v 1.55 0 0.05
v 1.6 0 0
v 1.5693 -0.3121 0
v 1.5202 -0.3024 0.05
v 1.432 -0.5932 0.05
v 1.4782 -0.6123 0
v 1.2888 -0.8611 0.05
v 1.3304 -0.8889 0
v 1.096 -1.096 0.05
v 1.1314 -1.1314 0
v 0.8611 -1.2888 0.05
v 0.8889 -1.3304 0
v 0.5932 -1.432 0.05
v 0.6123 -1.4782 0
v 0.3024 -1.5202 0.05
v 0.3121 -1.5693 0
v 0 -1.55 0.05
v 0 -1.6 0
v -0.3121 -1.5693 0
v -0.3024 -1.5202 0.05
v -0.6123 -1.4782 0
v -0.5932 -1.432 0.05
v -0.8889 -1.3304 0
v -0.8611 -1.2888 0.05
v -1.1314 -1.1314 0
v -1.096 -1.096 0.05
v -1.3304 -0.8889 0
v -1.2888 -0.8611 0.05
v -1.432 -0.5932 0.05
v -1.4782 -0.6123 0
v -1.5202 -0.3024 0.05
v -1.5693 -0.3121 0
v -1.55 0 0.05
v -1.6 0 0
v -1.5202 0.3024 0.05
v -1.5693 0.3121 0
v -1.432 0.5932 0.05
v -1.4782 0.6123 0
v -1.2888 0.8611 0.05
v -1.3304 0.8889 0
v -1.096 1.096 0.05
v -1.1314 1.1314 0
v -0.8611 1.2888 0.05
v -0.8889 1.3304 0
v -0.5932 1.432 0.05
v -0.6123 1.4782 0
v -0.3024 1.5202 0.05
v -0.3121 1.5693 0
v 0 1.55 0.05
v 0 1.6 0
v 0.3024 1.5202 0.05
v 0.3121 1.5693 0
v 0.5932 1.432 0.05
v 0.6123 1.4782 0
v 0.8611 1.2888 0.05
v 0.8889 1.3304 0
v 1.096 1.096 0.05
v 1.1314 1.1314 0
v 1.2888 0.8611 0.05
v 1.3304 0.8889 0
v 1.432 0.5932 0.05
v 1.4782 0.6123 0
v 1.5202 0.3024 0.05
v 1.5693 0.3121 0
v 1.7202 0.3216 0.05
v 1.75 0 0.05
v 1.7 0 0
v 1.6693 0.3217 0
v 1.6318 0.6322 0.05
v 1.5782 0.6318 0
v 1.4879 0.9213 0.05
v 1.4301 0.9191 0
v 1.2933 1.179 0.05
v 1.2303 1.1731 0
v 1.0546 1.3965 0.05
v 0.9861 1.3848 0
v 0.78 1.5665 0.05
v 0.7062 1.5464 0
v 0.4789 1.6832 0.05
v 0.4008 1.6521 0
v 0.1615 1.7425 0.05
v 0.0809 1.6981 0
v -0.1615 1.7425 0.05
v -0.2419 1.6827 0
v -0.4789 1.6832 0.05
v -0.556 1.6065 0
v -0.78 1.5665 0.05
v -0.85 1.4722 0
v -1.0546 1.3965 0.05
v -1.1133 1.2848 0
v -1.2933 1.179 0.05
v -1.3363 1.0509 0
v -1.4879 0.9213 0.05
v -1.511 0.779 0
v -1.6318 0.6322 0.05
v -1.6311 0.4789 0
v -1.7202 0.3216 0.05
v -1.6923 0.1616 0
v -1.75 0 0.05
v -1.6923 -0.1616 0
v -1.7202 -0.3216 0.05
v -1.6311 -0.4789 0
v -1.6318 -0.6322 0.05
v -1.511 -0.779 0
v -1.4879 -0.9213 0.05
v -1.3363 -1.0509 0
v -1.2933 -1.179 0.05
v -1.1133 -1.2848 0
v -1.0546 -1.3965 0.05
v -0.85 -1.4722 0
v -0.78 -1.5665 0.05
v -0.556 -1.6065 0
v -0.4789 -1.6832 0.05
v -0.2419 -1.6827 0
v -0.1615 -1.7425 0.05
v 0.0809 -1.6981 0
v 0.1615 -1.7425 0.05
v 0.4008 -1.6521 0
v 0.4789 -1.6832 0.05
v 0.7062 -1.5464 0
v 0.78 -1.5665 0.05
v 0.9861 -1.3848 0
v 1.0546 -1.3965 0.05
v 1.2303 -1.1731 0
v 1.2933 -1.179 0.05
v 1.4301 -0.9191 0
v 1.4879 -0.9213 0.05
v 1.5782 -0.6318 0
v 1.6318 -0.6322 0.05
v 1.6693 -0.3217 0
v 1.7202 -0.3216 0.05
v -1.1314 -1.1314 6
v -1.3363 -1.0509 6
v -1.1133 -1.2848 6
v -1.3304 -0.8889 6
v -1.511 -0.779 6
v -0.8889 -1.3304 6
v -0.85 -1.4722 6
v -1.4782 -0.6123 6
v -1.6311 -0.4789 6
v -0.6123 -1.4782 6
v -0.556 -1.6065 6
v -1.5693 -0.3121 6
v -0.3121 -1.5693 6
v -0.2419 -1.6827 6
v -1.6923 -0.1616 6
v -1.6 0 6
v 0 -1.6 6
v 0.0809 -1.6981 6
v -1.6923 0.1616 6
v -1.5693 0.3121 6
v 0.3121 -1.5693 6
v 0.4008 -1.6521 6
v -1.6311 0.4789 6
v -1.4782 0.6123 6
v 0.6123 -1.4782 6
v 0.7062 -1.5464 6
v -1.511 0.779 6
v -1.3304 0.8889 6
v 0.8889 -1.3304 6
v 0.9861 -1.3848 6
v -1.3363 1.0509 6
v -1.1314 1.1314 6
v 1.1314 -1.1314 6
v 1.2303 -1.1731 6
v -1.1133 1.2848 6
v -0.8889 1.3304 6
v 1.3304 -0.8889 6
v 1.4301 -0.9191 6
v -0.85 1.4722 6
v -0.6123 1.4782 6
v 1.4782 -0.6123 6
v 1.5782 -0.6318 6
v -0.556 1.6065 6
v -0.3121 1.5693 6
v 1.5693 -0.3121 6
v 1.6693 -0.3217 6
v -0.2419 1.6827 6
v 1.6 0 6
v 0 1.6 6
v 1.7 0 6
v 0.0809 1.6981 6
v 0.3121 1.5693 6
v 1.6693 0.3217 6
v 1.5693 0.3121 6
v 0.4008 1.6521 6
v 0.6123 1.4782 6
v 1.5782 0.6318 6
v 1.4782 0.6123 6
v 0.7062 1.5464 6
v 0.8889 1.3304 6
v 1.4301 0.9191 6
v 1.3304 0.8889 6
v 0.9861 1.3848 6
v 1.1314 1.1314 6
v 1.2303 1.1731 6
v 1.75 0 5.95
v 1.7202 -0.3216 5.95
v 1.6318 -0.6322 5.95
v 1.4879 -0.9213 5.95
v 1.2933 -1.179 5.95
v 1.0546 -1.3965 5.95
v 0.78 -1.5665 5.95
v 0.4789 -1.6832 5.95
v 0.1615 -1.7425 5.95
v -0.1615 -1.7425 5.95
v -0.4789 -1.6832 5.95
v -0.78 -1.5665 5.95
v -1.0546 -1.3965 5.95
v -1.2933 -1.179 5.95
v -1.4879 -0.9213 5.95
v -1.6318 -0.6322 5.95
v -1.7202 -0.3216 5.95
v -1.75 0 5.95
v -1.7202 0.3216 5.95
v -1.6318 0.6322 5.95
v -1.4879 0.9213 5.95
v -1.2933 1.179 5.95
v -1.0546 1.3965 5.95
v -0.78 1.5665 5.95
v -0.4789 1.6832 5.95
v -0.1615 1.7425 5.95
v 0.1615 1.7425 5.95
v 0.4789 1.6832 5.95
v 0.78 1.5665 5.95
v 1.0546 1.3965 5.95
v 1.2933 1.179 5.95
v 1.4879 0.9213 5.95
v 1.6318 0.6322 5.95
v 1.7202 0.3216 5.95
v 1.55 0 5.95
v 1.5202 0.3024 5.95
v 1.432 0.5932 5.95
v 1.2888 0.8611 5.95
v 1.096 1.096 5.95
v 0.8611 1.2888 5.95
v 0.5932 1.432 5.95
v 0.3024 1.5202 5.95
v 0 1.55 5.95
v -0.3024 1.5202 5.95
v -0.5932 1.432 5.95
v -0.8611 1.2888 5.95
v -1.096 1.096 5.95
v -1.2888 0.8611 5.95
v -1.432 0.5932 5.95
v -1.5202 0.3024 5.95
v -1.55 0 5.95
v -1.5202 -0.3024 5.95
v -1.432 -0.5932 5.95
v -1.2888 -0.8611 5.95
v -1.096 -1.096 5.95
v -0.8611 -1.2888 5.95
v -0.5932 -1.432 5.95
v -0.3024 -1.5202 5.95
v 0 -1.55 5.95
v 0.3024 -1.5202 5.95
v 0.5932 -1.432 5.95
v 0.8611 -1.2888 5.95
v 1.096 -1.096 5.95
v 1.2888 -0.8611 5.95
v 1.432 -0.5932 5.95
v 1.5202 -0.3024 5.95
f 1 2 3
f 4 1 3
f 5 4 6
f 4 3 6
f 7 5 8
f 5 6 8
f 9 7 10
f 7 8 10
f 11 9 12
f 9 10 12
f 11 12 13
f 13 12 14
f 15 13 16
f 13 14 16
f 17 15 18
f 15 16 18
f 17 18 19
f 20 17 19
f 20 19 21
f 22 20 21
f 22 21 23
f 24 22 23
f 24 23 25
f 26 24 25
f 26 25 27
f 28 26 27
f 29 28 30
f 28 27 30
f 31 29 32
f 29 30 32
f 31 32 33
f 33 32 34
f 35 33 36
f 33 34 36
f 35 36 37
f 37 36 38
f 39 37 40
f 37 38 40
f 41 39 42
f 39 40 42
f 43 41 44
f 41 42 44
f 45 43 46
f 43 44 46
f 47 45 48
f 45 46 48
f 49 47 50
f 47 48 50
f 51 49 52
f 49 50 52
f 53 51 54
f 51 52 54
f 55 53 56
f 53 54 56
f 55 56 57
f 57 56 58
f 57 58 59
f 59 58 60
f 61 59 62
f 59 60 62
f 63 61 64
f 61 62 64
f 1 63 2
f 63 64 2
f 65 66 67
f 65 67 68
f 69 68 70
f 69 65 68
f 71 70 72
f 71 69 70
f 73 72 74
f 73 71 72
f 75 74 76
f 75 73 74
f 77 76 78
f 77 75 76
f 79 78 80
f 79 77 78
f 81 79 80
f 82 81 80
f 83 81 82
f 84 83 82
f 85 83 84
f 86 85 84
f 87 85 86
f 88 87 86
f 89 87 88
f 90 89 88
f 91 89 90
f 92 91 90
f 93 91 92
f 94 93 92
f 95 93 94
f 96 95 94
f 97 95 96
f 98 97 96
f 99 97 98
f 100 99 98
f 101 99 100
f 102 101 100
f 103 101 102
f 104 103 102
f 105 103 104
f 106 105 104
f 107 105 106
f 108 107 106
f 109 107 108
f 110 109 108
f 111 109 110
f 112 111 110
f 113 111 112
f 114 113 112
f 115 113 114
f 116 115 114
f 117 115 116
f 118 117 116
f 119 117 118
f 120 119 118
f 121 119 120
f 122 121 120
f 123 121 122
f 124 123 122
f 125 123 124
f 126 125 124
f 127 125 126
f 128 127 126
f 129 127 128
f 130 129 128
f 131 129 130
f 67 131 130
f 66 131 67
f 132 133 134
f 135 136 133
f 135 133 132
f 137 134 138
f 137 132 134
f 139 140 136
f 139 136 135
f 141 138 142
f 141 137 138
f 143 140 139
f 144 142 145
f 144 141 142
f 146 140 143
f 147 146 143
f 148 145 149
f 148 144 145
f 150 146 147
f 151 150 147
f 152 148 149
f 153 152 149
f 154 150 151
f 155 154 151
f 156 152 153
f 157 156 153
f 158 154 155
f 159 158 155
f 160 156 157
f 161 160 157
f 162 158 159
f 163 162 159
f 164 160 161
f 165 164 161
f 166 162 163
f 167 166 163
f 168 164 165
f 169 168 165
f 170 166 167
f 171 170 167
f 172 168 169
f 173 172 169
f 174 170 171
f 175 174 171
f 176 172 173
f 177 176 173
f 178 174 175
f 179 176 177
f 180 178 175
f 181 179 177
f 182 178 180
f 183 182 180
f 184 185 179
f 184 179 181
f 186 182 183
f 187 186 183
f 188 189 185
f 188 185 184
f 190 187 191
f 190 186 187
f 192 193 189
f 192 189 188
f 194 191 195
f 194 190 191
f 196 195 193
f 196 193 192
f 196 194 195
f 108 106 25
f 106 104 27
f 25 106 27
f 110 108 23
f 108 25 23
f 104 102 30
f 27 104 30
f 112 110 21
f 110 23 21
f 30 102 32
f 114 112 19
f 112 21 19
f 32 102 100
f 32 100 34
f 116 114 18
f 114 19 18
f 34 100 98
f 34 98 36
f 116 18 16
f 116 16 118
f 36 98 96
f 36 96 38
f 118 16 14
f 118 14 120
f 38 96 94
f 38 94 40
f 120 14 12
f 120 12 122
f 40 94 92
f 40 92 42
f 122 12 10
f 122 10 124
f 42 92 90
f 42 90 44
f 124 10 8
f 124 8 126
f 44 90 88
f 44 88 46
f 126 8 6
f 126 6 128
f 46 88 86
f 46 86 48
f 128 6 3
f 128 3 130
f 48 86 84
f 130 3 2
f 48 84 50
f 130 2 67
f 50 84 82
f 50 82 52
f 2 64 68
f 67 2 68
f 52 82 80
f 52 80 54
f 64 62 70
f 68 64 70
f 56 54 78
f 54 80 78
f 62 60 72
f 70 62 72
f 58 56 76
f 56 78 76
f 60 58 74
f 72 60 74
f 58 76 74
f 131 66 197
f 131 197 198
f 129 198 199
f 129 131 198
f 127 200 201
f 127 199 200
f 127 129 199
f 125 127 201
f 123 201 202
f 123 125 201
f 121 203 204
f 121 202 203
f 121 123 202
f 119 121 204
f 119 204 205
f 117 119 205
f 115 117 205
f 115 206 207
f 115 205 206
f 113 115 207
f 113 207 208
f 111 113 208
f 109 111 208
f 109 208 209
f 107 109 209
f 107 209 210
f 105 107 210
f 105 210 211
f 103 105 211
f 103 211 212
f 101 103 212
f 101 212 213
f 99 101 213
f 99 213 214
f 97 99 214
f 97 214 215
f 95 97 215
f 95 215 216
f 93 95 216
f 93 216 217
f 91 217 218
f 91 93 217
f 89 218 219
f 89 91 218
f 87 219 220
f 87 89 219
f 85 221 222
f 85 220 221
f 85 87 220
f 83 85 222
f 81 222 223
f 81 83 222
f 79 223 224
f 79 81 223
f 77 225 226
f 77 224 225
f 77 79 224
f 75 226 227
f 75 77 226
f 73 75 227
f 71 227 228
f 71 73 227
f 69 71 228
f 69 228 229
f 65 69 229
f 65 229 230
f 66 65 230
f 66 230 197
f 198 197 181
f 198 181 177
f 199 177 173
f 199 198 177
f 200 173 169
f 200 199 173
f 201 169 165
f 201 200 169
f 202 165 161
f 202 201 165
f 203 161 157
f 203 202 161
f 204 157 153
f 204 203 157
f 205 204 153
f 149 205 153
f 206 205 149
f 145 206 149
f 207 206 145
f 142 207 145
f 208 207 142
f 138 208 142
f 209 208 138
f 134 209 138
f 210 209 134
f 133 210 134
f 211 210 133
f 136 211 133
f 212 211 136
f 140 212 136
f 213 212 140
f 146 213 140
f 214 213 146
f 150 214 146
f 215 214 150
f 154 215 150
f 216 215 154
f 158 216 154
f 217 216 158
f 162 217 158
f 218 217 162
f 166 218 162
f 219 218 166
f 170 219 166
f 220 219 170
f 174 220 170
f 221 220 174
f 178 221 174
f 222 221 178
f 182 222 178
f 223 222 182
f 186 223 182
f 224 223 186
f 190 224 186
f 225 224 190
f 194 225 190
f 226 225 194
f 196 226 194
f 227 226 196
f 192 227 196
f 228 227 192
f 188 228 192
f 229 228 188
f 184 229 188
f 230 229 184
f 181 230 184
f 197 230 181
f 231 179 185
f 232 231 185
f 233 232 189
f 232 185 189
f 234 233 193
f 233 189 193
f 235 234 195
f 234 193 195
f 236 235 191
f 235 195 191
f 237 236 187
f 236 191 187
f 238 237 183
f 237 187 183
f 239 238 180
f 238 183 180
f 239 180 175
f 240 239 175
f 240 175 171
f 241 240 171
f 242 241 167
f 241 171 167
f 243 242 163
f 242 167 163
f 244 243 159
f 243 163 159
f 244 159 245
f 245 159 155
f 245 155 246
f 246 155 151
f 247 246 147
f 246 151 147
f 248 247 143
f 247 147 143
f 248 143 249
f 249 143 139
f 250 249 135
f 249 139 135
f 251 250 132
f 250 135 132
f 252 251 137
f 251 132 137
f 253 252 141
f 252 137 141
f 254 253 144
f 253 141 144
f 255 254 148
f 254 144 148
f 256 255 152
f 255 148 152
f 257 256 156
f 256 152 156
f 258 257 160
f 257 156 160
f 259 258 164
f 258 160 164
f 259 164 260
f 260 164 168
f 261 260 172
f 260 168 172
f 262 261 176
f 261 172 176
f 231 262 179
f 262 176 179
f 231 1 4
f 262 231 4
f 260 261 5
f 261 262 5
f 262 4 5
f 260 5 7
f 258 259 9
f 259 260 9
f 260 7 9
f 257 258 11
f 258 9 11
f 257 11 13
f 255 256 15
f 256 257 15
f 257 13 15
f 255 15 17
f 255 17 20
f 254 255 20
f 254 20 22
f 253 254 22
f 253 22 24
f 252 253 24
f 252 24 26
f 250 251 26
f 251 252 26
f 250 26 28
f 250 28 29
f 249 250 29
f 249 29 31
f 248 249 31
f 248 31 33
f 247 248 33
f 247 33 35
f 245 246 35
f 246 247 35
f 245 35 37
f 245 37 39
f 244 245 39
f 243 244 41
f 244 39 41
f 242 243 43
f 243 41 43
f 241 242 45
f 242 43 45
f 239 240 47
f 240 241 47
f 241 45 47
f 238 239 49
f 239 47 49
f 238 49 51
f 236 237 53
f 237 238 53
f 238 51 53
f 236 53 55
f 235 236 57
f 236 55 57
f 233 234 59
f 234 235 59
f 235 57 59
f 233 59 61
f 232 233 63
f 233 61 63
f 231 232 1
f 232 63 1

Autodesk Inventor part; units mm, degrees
ref_plane "YZ Plane" through (0, 0, 0) normal (1, 0, 0) x (0, 1, 0)
ref_plane "XZ Plane" through (0, 0, 0) normal (0, 1, 0) x (-1, 0, 0)
ref_plane "XY Plane" through (0, 0, 0) normal (0, 0, 1) x (1, 0, 0)
sketch "Sketch1" plane through (0, 0, 0) normal (0, 0, 1) x (1, 0, 0)
  line L0 (0, -2.45) -> (0, 2.45) construction
  line L1 (-2.45, 0) -> (2.45, 0) construction
  circle A0 centre (0, 0) radius 1.75
  circle A1 centre (0, 0) radius 1.55
  dimension "d0" = 3.5
  dimension "d1" = 0.2
extrude "Extrusion1" add sketch "Sketch1" along normal blind 6
chamfer "Chamfer1" distance 0.05 angle 45 4 edges at (-1.75, 0, 6) (-1.55, 0, 6) (-1.75, 0, 0) (-1.55, 0, 0)
properties part number "OutputBeltTensionerSleeve 5mm"
